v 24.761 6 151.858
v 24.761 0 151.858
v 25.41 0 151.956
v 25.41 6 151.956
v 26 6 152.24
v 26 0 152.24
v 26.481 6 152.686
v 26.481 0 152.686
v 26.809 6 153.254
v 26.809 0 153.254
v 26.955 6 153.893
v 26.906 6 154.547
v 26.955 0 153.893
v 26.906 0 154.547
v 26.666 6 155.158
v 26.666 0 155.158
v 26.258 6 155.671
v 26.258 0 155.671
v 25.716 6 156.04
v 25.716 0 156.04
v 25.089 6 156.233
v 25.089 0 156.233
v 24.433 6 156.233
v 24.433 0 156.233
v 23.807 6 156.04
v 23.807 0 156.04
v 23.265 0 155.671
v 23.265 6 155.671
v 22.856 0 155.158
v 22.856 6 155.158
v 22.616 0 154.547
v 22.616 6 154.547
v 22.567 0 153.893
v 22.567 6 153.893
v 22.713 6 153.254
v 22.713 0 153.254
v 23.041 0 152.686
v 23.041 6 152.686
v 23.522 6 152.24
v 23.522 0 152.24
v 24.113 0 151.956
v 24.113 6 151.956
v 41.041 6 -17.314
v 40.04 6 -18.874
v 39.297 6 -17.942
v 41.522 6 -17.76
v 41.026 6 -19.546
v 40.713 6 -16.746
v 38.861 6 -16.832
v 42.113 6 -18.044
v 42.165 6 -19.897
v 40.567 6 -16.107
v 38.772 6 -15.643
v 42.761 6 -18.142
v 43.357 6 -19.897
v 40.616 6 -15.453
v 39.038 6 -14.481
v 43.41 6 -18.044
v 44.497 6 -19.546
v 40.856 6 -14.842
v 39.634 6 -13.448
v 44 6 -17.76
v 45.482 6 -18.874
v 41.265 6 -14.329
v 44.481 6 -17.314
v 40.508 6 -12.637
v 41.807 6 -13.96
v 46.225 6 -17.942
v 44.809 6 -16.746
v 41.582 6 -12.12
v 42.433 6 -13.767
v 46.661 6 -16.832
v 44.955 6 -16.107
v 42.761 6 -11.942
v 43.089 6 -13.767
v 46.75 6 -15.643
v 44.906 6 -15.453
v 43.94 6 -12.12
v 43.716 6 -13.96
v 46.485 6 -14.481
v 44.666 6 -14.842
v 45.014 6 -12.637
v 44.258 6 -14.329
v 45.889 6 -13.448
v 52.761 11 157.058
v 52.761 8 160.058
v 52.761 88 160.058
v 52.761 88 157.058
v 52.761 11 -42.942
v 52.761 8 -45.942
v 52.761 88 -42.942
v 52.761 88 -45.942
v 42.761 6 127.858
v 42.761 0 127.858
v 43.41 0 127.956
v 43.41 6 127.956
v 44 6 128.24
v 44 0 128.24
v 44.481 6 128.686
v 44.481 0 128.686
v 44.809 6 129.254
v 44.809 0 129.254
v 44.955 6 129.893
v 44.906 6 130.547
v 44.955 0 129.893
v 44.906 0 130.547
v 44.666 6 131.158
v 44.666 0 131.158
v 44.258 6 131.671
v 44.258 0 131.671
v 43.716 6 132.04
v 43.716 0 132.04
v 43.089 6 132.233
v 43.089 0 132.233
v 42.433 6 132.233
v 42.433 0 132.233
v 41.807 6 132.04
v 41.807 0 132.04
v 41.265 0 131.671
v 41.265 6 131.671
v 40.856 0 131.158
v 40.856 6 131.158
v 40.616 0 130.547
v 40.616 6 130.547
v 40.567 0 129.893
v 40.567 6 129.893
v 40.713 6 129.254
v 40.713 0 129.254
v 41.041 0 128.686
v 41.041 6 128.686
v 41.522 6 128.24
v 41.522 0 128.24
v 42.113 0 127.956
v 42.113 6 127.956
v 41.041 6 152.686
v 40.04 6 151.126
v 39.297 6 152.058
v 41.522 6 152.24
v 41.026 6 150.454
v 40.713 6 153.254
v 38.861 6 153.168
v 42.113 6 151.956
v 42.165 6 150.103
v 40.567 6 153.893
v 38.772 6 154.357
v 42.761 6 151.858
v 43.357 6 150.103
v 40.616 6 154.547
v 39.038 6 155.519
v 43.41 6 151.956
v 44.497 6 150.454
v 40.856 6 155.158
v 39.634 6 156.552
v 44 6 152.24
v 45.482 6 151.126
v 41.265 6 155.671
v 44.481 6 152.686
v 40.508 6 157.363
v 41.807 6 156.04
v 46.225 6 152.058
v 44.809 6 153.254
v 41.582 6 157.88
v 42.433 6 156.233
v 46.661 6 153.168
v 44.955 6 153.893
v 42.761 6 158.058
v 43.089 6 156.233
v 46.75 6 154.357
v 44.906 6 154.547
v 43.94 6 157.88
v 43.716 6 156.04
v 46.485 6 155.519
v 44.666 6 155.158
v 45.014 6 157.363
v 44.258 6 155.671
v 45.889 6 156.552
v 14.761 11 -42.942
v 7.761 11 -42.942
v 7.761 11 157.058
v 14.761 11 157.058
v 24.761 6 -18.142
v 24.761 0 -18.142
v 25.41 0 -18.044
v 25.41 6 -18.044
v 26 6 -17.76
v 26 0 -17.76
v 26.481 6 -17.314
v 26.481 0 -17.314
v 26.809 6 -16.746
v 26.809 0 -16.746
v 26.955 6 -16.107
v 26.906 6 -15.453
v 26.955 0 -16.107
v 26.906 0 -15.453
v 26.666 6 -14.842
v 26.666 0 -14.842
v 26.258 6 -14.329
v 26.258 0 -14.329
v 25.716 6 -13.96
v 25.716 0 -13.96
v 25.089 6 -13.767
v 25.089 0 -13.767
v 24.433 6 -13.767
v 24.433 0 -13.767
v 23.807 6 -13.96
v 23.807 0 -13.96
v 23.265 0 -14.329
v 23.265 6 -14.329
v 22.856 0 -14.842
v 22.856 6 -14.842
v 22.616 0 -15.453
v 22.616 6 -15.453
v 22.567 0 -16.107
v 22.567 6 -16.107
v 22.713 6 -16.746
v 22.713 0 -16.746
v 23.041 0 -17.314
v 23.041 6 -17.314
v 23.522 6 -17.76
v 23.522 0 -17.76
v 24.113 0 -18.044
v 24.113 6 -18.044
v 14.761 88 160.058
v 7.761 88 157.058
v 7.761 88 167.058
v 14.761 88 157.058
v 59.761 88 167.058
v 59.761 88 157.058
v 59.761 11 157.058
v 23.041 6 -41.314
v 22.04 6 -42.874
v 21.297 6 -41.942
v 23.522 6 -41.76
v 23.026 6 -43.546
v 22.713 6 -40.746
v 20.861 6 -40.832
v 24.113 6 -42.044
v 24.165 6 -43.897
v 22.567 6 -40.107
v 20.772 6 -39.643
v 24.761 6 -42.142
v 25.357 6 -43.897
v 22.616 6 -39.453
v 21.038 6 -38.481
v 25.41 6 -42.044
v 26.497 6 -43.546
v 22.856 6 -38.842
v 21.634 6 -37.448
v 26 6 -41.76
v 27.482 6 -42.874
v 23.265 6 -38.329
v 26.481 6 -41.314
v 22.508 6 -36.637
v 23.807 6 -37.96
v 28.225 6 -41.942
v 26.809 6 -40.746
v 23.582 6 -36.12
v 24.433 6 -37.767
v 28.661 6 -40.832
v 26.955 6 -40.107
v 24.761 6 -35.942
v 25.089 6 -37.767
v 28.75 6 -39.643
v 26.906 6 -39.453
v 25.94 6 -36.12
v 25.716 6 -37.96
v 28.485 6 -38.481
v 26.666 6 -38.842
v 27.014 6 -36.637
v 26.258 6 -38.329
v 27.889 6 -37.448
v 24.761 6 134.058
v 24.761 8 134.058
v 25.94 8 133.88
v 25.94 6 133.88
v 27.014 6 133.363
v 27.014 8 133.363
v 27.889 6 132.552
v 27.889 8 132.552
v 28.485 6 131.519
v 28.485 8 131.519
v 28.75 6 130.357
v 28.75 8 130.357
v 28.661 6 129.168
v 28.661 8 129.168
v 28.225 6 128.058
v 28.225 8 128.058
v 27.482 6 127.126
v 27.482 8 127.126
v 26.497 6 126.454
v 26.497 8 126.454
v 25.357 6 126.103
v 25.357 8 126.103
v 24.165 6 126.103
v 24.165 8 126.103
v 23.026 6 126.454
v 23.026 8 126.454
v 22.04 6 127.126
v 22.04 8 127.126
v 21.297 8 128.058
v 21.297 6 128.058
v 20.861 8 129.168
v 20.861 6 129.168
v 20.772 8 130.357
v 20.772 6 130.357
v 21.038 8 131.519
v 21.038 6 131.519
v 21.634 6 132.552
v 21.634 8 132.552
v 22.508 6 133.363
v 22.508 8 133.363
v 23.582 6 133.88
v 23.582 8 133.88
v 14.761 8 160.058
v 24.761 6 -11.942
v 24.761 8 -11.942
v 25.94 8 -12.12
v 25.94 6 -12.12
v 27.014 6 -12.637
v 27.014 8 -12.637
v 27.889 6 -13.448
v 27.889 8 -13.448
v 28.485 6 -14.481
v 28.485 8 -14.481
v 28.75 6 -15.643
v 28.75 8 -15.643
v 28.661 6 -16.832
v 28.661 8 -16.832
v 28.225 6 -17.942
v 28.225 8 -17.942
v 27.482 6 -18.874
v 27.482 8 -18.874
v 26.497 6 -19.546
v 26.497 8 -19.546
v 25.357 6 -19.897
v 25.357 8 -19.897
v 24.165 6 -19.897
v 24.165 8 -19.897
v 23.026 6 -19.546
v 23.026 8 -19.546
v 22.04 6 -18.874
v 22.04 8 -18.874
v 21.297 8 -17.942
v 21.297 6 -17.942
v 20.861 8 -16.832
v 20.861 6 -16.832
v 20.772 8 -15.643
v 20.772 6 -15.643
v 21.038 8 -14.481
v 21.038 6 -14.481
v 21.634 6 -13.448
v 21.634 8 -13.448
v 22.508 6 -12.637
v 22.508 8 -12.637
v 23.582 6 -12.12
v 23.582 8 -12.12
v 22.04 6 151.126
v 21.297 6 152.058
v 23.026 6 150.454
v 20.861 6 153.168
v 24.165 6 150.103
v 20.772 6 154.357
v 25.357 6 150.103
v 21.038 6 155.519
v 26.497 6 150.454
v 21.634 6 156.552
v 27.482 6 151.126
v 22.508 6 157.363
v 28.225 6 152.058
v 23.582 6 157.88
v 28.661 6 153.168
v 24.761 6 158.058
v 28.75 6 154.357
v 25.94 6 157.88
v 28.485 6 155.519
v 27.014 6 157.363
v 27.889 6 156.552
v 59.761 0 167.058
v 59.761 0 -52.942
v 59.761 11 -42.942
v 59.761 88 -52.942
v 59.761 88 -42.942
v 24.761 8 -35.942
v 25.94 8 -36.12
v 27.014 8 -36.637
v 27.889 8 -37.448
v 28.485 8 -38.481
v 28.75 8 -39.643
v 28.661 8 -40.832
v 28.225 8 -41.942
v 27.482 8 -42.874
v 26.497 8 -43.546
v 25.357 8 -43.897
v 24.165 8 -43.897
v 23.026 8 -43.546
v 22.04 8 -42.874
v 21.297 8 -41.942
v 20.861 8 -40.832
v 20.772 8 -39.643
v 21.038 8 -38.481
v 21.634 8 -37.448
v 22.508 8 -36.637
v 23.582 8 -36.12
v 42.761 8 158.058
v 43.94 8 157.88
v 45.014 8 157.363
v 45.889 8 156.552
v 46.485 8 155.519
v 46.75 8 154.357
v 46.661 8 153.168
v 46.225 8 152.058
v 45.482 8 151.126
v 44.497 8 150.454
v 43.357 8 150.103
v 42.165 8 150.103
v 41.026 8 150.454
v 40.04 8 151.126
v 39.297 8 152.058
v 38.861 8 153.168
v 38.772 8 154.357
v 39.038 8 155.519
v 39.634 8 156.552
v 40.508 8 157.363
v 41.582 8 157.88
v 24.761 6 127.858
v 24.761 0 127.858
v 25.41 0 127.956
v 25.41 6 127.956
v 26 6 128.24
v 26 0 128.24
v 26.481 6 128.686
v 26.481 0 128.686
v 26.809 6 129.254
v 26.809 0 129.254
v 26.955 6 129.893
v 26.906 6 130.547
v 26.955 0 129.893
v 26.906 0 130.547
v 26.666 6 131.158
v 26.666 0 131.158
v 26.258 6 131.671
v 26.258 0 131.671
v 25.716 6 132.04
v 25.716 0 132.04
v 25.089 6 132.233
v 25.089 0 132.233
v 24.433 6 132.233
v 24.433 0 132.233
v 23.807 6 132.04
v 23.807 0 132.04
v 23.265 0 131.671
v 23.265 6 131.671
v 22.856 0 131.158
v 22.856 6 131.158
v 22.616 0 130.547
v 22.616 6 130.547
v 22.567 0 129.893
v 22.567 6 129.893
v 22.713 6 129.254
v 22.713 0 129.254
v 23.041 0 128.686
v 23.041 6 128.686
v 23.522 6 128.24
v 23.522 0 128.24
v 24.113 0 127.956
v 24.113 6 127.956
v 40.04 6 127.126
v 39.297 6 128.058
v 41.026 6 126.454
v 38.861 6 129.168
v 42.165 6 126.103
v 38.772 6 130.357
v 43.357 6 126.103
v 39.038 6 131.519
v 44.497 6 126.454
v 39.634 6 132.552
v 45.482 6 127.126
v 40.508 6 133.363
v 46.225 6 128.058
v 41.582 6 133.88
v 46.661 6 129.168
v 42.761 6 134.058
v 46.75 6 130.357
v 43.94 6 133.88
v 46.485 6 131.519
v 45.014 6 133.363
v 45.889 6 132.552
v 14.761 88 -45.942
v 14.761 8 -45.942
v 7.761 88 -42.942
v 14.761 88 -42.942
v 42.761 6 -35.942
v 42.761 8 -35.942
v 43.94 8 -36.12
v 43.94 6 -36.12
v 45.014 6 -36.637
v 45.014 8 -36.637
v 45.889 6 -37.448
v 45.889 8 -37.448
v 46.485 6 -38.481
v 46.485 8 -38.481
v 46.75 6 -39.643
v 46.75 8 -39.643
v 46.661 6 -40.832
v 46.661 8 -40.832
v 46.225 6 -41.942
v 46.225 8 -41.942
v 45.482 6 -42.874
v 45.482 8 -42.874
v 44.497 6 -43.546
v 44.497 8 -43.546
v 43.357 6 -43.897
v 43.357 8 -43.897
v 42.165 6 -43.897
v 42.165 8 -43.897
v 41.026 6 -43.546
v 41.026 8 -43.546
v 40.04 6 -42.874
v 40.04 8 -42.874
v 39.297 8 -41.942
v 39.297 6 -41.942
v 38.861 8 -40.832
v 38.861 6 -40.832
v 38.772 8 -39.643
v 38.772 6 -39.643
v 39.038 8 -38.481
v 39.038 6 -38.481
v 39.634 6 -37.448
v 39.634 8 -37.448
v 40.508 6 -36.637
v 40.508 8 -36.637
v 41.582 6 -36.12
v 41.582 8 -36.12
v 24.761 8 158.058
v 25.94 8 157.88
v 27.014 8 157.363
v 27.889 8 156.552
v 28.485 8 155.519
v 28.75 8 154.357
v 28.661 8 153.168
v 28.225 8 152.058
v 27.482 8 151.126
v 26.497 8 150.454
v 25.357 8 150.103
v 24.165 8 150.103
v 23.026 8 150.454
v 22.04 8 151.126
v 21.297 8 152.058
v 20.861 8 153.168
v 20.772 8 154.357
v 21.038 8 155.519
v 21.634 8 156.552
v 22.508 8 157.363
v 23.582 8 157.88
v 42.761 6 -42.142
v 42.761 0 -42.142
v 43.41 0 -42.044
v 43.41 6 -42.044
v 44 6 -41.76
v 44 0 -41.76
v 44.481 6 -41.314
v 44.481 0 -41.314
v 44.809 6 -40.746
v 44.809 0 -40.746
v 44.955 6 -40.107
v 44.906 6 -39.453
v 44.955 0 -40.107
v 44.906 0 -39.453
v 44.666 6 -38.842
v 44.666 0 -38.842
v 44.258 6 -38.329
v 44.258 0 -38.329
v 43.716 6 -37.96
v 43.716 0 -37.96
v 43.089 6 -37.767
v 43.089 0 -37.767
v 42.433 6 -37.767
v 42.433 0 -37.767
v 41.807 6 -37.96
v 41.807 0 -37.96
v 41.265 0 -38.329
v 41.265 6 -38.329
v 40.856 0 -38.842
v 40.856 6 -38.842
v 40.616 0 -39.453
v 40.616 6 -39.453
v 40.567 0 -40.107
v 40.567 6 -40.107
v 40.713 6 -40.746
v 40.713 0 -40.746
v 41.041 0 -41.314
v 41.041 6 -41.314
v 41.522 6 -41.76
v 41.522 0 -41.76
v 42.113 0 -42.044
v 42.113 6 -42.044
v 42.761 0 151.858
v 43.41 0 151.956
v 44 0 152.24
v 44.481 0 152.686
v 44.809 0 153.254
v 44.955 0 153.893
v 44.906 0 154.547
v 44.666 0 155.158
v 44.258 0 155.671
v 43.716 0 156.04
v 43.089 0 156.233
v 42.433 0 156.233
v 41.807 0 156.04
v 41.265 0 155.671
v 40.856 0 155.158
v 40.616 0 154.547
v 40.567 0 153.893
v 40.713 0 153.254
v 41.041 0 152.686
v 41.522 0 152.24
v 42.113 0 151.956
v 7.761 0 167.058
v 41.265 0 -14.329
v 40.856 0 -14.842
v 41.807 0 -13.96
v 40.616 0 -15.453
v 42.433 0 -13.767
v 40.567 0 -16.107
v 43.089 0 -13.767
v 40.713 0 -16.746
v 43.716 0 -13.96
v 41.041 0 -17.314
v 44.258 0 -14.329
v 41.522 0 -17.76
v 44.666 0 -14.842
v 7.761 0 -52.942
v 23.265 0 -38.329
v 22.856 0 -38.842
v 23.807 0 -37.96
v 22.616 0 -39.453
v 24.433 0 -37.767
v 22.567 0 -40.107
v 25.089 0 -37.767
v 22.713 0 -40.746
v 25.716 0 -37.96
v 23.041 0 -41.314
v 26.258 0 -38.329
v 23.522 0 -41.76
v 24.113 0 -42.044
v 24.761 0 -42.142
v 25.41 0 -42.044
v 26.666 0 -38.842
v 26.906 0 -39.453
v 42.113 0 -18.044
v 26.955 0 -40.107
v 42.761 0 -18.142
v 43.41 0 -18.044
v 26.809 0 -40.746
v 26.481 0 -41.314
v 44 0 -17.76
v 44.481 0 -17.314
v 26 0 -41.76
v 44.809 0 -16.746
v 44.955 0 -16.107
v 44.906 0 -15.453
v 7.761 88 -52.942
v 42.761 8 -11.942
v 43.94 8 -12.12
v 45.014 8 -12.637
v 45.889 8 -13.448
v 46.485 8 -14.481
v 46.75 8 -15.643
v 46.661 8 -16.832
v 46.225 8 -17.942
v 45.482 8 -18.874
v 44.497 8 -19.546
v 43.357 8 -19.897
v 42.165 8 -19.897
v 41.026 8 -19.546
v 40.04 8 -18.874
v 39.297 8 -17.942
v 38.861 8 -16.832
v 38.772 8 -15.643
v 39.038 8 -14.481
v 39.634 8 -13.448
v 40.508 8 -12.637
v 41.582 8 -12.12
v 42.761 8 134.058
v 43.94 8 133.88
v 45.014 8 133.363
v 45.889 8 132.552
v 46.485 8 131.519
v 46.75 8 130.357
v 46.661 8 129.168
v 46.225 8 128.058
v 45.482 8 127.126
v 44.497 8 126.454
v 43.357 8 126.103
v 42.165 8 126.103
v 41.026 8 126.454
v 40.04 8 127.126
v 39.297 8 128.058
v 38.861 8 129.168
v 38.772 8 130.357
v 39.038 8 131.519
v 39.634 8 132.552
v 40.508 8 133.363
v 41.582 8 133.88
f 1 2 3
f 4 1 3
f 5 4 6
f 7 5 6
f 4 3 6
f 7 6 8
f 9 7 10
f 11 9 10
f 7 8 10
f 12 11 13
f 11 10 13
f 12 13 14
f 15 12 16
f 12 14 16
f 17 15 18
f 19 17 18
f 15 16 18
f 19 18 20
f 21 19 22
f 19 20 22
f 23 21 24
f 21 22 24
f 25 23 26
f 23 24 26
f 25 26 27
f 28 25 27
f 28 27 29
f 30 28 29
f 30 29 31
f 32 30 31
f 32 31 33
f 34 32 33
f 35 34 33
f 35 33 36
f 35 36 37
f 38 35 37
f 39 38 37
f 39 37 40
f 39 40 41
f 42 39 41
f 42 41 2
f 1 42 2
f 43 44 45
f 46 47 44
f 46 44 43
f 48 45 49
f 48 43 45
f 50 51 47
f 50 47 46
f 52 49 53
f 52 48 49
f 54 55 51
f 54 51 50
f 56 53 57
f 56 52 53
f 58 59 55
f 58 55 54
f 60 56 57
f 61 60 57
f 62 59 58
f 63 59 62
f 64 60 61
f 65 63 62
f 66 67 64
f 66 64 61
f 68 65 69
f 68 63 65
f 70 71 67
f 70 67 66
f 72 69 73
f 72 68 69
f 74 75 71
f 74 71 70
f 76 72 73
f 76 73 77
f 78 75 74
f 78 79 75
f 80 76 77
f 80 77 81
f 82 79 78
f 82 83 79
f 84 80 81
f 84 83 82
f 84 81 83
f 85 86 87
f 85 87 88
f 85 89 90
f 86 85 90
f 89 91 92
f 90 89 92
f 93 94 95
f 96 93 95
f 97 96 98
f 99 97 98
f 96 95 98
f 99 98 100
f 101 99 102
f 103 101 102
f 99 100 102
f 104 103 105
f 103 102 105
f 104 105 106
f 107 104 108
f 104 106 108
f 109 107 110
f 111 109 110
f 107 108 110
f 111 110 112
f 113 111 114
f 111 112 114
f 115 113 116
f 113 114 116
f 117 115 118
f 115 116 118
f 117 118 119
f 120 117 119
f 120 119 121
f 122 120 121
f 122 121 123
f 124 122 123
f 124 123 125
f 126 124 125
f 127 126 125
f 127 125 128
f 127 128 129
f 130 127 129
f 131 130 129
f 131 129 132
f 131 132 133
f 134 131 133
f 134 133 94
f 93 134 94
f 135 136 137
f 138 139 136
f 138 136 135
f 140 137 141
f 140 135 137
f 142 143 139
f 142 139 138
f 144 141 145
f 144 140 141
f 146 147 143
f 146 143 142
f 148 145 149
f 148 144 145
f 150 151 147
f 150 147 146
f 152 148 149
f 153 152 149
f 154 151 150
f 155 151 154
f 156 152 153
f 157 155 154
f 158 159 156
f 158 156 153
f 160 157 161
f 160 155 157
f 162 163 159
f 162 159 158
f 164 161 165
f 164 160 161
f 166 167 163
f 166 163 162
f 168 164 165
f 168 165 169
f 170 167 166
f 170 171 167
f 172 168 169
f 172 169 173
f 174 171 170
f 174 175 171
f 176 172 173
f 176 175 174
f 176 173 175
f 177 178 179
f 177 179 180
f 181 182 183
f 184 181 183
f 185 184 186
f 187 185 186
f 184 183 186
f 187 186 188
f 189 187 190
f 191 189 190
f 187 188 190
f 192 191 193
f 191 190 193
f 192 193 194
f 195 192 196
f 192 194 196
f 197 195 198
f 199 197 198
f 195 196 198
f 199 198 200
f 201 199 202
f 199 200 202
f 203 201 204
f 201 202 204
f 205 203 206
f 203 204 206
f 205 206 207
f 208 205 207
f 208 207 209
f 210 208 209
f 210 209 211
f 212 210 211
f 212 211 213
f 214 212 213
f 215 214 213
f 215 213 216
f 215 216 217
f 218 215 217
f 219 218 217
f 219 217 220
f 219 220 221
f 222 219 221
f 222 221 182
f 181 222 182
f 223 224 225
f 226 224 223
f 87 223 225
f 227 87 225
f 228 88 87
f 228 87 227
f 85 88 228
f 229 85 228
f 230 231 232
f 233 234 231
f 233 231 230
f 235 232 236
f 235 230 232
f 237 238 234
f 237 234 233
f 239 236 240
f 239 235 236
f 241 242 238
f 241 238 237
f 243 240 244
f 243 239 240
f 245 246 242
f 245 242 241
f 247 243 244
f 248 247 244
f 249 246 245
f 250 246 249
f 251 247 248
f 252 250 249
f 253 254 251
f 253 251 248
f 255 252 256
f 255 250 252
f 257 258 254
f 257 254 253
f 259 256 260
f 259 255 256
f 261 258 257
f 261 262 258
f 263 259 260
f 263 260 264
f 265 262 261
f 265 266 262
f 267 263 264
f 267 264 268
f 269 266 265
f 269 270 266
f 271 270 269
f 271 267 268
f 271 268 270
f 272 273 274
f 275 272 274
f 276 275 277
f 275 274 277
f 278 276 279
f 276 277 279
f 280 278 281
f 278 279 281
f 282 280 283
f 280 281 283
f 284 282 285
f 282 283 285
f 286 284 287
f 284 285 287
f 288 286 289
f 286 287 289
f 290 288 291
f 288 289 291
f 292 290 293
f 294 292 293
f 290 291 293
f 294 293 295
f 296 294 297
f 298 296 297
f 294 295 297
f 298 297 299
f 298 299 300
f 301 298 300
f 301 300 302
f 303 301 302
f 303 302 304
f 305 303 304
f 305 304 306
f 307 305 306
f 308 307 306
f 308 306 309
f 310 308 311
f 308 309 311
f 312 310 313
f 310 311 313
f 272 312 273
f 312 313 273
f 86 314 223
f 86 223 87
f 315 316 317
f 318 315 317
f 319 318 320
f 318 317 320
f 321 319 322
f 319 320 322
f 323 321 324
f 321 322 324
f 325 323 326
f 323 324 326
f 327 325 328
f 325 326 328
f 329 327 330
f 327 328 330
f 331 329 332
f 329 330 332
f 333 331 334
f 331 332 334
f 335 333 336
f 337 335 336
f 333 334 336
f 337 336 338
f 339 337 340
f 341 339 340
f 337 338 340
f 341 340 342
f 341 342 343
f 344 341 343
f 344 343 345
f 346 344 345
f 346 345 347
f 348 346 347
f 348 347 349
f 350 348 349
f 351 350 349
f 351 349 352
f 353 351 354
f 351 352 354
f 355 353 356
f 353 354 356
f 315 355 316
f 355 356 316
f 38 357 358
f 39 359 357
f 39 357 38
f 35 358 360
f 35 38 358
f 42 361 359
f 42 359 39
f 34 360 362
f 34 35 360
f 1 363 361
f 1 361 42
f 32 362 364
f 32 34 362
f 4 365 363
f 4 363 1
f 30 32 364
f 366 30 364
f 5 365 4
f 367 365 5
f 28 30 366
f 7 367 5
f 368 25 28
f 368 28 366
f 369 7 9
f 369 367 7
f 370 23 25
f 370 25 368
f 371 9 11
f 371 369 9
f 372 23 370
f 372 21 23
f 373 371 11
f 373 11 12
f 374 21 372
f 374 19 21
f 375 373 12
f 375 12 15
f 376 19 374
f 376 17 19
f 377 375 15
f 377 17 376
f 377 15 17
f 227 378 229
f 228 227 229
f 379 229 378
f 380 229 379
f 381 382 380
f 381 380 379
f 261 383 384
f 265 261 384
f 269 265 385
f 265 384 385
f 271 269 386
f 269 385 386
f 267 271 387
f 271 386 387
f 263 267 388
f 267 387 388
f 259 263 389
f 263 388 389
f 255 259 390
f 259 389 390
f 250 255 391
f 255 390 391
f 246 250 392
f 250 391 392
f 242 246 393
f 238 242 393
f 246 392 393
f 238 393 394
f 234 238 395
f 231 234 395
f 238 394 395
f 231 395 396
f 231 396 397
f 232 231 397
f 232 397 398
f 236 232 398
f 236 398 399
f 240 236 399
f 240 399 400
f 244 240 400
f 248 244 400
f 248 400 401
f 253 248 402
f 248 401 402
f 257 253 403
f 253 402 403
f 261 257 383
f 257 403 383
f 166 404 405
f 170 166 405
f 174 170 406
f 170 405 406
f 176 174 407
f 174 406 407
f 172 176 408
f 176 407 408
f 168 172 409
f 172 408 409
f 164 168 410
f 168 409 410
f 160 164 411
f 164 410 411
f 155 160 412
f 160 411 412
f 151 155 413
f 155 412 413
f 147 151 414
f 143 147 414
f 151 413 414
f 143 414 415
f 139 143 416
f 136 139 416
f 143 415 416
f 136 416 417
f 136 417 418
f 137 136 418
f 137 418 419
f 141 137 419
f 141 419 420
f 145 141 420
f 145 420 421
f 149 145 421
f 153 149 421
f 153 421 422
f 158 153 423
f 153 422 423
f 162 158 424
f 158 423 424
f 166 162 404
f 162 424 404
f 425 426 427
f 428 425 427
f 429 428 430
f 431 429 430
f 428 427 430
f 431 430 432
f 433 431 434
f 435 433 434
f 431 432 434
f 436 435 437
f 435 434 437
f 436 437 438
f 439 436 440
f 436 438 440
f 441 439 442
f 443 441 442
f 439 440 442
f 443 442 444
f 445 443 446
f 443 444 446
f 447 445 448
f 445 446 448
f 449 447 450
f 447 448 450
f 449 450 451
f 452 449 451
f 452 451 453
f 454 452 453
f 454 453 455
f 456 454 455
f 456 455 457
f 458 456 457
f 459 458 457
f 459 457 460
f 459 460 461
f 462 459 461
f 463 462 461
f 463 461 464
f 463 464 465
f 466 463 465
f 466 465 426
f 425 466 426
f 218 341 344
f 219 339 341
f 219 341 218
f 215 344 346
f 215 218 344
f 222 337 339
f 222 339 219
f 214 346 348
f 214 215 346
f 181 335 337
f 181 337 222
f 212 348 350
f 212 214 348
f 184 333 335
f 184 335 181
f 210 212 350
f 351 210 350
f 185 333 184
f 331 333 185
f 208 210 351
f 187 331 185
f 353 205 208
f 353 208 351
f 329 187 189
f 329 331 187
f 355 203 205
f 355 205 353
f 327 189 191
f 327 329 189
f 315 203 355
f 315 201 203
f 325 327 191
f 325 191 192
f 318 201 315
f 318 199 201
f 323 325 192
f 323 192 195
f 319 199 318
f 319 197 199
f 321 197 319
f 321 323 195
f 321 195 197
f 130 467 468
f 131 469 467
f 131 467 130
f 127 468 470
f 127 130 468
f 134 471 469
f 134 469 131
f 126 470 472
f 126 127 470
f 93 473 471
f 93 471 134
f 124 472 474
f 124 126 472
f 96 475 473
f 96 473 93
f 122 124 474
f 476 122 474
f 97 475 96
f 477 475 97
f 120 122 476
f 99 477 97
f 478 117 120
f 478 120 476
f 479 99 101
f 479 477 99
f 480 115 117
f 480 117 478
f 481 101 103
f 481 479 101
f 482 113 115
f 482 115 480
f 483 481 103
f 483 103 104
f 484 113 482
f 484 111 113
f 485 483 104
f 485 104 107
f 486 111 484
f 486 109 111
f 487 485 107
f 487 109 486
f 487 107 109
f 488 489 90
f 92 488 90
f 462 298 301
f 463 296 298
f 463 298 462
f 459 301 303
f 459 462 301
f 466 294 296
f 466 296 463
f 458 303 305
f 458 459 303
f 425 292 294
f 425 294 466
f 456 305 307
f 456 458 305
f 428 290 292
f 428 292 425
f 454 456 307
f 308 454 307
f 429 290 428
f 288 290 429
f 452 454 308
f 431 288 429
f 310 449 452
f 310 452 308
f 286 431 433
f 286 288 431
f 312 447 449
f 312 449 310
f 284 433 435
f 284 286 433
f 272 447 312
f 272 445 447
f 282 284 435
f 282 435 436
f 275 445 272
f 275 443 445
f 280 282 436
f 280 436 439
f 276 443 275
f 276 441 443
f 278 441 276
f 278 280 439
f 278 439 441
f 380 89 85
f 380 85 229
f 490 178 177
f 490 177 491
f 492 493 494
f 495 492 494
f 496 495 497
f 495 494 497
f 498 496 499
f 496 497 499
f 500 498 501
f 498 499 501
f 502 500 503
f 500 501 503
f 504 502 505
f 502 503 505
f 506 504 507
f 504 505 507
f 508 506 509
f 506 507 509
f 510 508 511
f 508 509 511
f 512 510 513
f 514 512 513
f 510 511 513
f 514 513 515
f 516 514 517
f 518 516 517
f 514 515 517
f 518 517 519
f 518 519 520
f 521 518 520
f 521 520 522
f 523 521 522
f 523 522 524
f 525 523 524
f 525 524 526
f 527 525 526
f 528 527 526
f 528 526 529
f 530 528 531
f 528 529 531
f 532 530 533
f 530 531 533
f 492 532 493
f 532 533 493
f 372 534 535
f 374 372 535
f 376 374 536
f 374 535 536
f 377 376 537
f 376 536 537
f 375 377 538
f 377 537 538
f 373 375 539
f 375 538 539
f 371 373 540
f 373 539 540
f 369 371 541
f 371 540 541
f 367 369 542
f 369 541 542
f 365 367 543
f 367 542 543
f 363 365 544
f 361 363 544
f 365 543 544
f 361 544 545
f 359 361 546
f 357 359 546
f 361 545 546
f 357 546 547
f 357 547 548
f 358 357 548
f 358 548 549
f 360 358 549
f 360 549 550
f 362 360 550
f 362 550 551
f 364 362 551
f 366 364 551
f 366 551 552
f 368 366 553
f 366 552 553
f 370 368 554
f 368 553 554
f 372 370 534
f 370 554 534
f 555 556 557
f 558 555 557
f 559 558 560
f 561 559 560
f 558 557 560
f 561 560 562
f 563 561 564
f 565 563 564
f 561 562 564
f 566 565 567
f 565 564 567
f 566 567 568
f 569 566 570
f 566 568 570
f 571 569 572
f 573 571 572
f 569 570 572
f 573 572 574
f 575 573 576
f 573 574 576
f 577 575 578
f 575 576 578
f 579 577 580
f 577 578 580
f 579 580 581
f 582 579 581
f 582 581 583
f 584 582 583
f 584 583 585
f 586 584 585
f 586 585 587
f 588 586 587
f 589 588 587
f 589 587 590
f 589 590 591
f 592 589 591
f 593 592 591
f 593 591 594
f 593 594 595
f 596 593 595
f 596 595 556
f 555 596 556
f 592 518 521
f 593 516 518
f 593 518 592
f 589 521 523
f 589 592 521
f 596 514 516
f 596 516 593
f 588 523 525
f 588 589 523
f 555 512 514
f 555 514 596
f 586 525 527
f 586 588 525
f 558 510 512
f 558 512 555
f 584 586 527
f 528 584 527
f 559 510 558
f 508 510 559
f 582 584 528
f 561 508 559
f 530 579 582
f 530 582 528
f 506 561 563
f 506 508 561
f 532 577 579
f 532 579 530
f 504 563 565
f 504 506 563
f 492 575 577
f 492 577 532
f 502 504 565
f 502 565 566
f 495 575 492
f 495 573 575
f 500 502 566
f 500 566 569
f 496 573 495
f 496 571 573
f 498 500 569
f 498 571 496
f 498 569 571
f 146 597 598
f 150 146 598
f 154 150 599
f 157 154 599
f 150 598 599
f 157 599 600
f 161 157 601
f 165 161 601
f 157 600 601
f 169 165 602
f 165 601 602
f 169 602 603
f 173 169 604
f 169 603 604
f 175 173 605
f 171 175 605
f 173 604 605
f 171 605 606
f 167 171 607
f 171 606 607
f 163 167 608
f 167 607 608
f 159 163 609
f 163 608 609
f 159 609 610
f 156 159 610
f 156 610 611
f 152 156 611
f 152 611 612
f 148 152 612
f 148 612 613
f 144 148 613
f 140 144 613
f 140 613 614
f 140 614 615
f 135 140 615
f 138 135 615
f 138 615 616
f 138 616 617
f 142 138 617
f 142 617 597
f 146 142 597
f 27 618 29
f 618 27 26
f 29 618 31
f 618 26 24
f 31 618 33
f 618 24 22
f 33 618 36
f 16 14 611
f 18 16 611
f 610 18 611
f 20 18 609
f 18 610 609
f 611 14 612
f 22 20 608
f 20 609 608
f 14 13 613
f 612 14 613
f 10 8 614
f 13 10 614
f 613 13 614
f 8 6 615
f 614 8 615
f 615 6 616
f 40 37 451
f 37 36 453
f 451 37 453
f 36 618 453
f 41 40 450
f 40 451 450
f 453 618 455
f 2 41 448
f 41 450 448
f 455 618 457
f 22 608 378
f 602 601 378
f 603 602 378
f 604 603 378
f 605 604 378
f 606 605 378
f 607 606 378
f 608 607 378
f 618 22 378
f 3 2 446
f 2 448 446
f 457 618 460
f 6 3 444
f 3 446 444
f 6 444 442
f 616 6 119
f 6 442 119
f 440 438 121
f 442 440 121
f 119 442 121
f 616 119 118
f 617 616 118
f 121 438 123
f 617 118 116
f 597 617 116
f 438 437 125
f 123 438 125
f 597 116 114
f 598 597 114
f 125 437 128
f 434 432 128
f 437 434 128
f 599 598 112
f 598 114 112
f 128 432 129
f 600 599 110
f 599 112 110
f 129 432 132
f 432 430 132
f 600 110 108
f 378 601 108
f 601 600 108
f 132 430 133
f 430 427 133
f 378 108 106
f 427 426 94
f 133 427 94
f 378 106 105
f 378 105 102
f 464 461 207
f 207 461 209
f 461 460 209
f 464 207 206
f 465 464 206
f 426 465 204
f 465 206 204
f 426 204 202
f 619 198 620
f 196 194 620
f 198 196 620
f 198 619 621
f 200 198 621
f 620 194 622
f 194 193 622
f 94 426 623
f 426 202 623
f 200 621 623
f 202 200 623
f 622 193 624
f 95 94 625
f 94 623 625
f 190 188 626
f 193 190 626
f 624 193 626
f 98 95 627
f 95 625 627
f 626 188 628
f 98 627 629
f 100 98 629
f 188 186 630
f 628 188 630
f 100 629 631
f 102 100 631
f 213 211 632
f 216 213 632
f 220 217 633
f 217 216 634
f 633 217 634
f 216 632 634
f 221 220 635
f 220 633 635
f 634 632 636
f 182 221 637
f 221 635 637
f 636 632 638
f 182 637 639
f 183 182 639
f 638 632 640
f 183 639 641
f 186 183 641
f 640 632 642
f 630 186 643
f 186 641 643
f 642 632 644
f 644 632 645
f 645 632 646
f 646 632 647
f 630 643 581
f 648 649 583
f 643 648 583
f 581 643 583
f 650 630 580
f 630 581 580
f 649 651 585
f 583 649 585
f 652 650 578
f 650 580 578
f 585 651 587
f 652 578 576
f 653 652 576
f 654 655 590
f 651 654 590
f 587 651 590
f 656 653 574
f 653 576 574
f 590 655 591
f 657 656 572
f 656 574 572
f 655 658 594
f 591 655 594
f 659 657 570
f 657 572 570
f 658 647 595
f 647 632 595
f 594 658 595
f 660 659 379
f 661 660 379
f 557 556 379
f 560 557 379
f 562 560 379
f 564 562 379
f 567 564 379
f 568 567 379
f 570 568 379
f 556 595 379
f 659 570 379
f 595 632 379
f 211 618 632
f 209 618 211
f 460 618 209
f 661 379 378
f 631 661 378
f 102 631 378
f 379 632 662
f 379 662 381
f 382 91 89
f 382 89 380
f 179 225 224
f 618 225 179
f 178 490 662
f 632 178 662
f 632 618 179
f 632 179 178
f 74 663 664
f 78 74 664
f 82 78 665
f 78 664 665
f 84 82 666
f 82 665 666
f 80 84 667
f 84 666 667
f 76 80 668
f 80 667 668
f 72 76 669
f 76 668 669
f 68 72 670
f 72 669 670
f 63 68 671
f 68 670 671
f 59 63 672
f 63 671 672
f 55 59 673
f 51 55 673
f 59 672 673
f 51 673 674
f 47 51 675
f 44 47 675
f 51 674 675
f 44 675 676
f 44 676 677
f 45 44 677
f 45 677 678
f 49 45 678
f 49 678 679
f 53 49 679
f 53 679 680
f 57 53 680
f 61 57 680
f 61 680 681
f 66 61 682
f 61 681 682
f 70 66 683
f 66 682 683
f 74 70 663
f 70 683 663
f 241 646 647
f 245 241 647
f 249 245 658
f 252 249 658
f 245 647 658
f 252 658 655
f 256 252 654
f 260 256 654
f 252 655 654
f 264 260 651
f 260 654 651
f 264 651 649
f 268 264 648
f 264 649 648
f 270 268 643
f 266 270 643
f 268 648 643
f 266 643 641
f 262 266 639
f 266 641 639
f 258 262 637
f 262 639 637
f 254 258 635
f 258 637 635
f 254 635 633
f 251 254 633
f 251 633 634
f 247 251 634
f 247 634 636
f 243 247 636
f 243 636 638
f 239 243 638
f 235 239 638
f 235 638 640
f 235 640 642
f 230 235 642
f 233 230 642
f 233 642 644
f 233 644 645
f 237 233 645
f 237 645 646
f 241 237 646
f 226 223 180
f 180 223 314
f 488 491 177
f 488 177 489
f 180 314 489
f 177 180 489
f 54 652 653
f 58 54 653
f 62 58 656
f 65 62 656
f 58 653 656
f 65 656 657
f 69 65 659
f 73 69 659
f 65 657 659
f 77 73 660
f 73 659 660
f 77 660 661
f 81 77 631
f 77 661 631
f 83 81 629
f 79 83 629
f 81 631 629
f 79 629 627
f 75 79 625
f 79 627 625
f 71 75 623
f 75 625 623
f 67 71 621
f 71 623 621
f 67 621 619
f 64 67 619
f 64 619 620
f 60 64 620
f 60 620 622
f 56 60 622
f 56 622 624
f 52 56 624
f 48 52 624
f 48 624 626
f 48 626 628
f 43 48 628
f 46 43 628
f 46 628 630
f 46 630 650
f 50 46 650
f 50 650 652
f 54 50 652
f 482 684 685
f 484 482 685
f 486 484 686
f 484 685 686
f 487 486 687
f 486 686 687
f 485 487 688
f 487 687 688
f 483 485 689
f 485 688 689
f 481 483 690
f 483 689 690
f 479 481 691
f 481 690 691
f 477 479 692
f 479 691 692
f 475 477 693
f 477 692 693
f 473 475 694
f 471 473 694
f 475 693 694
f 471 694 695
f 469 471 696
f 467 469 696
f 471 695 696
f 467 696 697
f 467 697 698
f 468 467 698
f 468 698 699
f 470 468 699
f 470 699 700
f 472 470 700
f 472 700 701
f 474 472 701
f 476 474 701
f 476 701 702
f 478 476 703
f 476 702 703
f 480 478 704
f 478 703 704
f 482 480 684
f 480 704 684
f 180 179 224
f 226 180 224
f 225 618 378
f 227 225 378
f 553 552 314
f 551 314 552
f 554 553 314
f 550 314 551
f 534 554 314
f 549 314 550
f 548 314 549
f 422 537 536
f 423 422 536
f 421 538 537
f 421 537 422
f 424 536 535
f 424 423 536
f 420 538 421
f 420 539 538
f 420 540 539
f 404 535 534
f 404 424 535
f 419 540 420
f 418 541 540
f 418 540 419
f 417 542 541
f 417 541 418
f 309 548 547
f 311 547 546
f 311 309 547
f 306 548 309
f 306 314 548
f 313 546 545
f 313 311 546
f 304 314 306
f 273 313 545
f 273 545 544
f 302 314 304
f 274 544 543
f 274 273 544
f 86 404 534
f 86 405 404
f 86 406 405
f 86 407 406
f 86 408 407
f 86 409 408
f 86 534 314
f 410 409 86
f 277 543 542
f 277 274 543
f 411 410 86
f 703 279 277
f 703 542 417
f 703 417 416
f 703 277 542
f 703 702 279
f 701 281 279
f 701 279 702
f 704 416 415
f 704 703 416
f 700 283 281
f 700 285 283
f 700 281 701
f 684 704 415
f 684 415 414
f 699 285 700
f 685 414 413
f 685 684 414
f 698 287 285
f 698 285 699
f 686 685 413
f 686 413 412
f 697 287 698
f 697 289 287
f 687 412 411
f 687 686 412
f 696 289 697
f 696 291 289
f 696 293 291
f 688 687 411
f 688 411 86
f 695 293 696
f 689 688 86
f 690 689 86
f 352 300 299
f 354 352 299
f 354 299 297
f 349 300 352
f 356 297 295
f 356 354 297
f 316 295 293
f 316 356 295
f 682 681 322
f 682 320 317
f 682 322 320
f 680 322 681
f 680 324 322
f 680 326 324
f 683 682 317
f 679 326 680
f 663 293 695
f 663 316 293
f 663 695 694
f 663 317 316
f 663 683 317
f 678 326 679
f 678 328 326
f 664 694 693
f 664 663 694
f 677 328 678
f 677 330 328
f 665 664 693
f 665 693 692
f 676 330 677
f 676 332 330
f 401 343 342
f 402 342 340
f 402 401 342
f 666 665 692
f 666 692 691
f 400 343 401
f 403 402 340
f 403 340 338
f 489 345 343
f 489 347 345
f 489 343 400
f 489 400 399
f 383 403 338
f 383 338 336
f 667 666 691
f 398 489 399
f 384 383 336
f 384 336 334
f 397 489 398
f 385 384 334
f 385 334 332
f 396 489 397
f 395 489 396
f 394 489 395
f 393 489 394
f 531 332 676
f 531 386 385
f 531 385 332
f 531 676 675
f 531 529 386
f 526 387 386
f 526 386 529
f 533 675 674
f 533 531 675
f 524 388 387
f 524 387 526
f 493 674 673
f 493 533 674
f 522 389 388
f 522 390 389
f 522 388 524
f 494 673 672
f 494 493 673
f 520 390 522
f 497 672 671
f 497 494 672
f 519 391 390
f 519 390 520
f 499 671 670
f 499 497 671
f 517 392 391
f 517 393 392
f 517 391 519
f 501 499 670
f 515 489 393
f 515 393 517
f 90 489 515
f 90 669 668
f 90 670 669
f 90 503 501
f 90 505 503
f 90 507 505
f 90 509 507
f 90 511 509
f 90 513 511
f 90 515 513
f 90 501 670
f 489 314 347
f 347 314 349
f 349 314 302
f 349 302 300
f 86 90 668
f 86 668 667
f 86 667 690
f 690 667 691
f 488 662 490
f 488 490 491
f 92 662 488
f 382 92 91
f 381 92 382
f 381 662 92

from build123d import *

# Parameters (mm, degrees)
SKETCH1_W           = 52
SKETCH1_H           = 220
BOSS_EXTRUDE1_DEPTH = 8
SKETCH2_W           = 7
SKETCH2_H           = 220
BOSS_EXTRUDE2_DEPTH = 80
SKETCH3_W           = 45
SKETCH3_H           = 7
BOSS_EXTRUDE3_DEPTH = 80
SKETCH4_W           = 45
SKETCH4_H           = 7
BOSS_EXTRUDE4_DEPTH = 80
SKETCH8_W           = 200
SKETCH8_H           = 80
CUT_EXTRUDE3_DEPTH  = 10
SKETCH10_R          = 2.2
CUT_EXTRUDE5_DEPTH  = 8
SKETCH11_W          = 7
SKETCH11_H          = 206
SKETCH11_H_2        = 200
BOSS_EXTRUDE6_DEPTH = 3
SKETCH12_W          = 7
SKETCH12_H          = 3
BOSS_EXTRUDE7_DEPTH = 77
SKETCH13_R          = 4
CUT_EXTRUDE6_DEPTH  = 2


with BuildPart() as part:
    # Sketch1 → Boss-Extrude1 (new body)
    with BuildSketch(Plane(origin=(0, 0, 0), x_dir=(1, 0, 0), z_dir=(0, 1, 0))):
        with Locations((33.761174554, -57.057839406)):
            Rectangle(SKETCH1_W, SKETCH1_H)
    extrude(amount=BOSS_EXTRUDE1_DEPTH)

    # Sketch2 → Boss-Extrude2 (add)
    with BuildSketch(Plane(origin=(0, 8, 0), x_dir=(1, 0, 0), z_dir=(0, 1, 0))):
        with Locations((11.261174554, -57.057839406)):
            Rectangle(SKETCH2_W, SKETCH2_H)
    extrude(amount=BOSS_EXTRUDE2_DEPTH)

    # Sketch3 → Boss-Extrude3 (add)
    with BuildSketch(Plane(origin=(0, 8, 0), x_dir=(1, 0, 0), z_dir=(0, 1, 0))):
        with Locations((37.261174554, -163.557839406)):
            Rectangle(SKETCH3_W, SKETCH3_H)
    extrude(amount=BOSS_EXTRUDE3_DEPTH)

    # Sketch4 → Boss-Extrude4 (add)
    with BuildSketch(Plane(origin=(0, 8, 0), x_dir=(1, 0, 0), z_dir=(0, 1, 0))):
        with Locations((37.261174554, 49.442160594)):
            Rectangle(SKETCH4_W, SKETCH4_H)
    extrude(amount=BOSS_EXTRUDE4_DEPTH)

    # Sketch8 → Cut-Extrude3 (cut)
    with BuildSketch(Plane.ZY.offset(-7.761174554)):
        with Locations((57.057839406, 48)):
            Rectangle(SKETCH8_W, SKETCH8_H)
    extrude(amount=-CUT_EXTRUDE3_DEPTH, mode=Mode.SUBTRACT)

    # Sketch10 → Cut-Extrude5 (cut)
    with BuildSketch(Plane.XZ):
        with Locations(Location((24.761174554, 154.057839406, 0), (0, 0, 270))):
            Circle(SKETCH10_R)
        with Locations(Location((42.761174554, 154.057839406, 0), (0, 0, 270))):
            Circle(SKETCH10_R)
        with Locations(Location((42.761174554, 130.057839406, 0), (0, 0, 270))):
            Circle(SKETCH10_R)
        with Locations(Location((24.761174554, 130.057839406, 0), (0, 0, 270))):
            Circle(SKETCH10_R)
        with Locations(Location((24.761174554, -15.942160594, 0), (0, 0, 270))):
            Circle(SKETCH10_R)
        with Locations(Location((42.761174554, -15.942160594, 0), (0, 0, 270))):
            Circle(SKETCH10_R)
        with Locations(Location((42.761174554, -39.942160594, 0), (0, 0, 270))):
            Circle(SKETCH10_R)
        with Locations(Location((24.761174554, -39.942160594, 0), (0, 0, 270))):
            Circle(SKETCH10_R)
    extrude(amount=-CUT_EXTRUDE5_DEPTH, mode=Mode.SUBTRACT)

    # Sketch11 → Boss-Extrude6 (add)
    with BuildSketch(Plane(origin=(0, 8, 0), x_dir=(1, 0, 0), z_dir=(0, 1, 0))):
        with Locations((56.261174554, -57.057839406)):
            Rectangle(SKETCH11_W, SKETCH11_H)
        with Locations((11.261174554, -57.057839406)):
            Rectangle(SKETCH11_W, SKETCH11_H_2)
    extrude(amount=BOSS_EXTRUDE6_DEPTH)

    # Sketch12 → Boss-Extrude7 (add)
    with BuildSketch(Plane(origin=(0, 88, 0), x_dir=(1, 0, 0), z_dir=(0, 1, 0))):
        with Locations((56.261174554, 44.442160594)):
            Rectangle(SKETCH12_W, SKETCH12_H)
        with Locations((56.261174554, -158.557839406)):
            Rectangle(SKETCH12_W, SKETCH12_H)
    extrude(amount=-BOSS_EXTRUDE7_DEPTH)

    # Sketch13 → Cut-Extrude6 (cut)
    with BuildSketch(Plane(origin=(0, 8, 0), x_dir=(1, 0, 0), z_dir=(0, 1, 0))):
        with Locations(Location((42.761174554, -154.057839406, 0), (0, 0, 270))):
            Circle(SKETCH13_R)
        with Locations(Location((24.761174554, -154.057839406, 0), (0, 0, 270))):
            Circle(SKETCH13_R)
        with Locations(Location((24.761174554, -130.057839406, 0), (0, 0, 270))):
            Circle(SKETCH13_R)
        with Locations(Location((42.761174554, -130.057839406, 0), (0, 0, 270))):
            Circle(SKETCH13_R)
        with Locations(Location((42.761174554, 15.942160594, 0), (0, 0, 270))):
            Circle(SKETCH13_R)
        with Locations(Location((24.761174554, 15.942160594, 0), (0, 0, 270))):
            Circle(SKETCH13_R)
        with Locations(Location((24.761174554, 39.942160594, 0), (0, 0, 270))):
            Circle(SKETCH13_R)
        with Locations(Location((42.761174554, 39.942160594, 0), (0, 0, 270))):
            Circle(SKETCH13_R)
    extrude(amount=-CUT_EXTRUDE6_DEPTH, mode=Mode.SUBTRACT)


solid = part.part
